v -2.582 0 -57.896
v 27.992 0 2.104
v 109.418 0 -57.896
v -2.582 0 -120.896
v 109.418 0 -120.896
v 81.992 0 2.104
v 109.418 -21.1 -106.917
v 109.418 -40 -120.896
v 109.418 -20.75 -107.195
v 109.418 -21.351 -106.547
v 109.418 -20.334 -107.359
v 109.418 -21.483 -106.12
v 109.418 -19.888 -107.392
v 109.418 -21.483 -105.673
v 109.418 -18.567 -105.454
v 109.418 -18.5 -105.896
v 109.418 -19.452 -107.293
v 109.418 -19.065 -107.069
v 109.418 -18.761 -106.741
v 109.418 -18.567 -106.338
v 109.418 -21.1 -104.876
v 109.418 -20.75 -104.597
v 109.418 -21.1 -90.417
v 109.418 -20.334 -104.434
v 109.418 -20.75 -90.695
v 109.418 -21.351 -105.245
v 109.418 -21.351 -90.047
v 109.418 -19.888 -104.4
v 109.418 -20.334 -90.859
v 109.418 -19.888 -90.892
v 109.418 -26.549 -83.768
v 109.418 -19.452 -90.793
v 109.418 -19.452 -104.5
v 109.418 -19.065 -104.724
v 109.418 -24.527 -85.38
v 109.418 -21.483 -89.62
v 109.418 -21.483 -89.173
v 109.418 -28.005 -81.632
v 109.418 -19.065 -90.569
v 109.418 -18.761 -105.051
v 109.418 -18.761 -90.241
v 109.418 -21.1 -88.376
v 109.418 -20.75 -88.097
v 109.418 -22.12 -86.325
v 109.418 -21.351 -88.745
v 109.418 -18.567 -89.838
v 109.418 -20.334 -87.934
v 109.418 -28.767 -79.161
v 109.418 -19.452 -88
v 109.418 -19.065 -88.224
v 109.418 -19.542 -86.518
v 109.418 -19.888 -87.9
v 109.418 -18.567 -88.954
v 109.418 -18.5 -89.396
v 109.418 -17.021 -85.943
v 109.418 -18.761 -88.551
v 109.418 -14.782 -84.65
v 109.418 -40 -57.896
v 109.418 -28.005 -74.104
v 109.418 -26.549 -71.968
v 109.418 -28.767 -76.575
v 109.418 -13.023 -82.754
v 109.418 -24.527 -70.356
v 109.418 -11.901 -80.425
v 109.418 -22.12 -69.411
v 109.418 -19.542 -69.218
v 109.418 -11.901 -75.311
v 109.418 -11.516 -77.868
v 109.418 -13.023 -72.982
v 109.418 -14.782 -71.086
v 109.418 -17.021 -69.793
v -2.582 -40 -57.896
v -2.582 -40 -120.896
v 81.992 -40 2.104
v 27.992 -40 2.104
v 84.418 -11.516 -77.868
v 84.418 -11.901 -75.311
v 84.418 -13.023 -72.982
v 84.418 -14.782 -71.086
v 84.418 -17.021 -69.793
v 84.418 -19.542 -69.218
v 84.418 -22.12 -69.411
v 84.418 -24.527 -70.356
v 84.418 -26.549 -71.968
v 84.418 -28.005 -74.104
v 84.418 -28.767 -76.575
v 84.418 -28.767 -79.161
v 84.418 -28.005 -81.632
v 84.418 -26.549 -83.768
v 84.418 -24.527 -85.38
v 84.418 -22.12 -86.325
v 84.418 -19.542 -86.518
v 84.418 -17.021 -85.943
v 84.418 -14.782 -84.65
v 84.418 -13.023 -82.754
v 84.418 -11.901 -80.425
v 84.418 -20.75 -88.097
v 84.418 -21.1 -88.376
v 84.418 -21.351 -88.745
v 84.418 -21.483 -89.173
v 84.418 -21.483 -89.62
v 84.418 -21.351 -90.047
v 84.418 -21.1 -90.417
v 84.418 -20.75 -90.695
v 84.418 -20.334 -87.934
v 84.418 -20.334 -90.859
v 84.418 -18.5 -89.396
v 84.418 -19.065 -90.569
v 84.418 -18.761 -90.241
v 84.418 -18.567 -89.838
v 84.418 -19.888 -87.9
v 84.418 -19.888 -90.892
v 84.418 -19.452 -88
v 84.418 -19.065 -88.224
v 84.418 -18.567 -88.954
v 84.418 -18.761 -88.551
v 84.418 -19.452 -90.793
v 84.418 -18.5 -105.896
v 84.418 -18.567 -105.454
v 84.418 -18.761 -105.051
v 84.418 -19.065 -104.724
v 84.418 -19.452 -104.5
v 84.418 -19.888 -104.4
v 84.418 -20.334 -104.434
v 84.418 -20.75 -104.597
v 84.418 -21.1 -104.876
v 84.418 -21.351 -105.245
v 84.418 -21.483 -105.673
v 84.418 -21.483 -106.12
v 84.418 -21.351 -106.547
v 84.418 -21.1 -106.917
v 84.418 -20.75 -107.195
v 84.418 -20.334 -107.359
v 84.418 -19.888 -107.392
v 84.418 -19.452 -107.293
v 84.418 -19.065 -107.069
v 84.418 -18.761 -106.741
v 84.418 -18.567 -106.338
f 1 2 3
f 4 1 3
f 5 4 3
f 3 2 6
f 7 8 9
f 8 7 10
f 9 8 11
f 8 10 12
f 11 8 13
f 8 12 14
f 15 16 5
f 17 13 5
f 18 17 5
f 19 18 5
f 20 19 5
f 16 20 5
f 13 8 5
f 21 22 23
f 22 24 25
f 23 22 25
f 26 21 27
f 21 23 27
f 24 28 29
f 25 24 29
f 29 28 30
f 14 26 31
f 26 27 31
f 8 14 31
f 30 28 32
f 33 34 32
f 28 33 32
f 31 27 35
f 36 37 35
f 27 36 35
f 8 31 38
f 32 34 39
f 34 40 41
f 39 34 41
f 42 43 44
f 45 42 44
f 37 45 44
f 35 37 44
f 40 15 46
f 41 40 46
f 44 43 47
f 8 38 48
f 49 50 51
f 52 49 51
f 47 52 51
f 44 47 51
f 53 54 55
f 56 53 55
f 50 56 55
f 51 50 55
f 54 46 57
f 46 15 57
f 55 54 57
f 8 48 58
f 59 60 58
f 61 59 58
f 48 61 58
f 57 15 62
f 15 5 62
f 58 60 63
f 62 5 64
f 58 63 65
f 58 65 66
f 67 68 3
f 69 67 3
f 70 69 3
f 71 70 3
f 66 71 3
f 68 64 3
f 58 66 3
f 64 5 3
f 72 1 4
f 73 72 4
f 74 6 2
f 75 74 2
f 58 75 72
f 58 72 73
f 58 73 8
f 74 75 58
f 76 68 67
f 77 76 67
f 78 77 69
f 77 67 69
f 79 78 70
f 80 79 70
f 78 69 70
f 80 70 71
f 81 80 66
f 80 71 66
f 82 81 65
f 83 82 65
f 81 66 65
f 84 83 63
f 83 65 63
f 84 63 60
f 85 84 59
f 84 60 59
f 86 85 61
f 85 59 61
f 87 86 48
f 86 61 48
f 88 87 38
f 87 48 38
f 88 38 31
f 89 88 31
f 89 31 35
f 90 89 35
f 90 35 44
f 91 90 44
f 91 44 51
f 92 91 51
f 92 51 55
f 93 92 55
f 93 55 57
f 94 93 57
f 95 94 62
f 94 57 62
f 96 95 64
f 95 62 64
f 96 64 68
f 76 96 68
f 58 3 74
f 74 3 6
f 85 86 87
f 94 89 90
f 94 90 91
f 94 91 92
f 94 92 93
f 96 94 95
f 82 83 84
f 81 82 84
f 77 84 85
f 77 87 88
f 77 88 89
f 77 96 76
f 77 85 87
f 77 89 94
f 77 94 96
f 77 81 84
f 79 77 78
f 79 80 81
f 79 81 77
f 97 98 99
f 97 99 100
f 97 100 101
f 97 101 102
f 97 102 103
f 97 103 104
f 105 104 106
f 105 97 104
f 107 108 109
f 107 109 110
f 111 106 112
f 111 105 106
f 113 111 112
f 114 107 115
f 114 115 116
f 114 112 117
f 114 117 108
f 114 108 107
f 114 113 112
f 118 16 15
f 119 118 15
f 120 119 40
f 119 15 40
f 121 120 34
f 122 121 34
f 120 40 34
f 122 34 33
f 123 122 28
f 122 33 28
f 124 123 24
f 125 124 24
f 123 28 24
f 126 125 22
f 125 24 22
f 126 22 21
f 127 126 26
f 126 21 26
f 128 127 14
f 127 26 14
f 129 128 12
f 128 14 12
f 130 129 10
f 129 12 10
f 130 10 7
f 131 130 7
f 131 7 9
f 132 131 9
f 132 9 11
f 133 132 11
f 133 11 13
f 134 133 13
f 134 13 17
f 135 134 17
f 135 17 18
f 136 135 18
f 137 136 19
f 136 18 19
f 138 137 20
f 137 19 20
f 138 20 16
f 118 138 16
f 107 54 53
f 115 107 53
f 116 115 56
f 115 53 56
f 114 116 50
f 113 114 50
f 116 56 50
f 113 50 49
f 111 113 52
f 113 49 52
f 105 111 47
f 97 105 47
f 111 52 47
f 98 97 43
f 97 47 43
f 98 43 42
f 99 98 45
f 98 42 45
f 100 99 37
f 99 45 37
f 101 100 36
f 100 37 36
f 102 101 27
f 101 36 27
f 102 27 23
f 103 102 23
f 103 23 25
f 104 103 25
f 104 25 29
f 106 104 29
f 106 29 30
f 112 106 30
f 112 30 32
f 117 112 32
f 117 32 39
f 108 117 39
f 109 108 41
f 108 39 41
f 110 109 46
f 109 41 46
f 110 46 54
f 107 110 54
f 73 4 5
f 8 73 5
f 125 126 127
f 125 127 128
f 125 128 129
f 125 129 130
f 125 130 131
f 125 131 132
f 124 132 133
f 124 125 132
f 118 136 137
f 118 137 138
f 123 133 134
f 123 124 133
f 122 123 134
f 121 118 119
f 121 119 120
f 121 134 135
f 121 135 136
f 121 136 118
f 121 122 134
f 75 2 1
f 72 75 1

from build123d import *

# Parameters (mm, degrees)
F1_DEPTH = 40
F2_R     = 1.5
F3_DEPTH = 25
F4_R     = 8.674153
F5_DEPTH = 25


with BuildPart() as f1:
    # F0 (on Front) → F1 (new body)
    with BuildSketch(Plane.XZ):
        Polygon((76.767643, 2.10375), (27.992256, 2.10375), (-2.5816, -57.89625), (-2.5816, -120.89625), (109.4184, -120.89625), (109.4184, -59.39625), (109.4184, -57.89625), (81.992256, 2.10375), align=None)
    extrude(amount=F1_DEPTH)

    # F2 (on face) → F3 (cut)
    with BuildSketch(Plane.YZ.offset(109.4184)):
        with Locations((-20, -105.89625)):
            Circle(F2_R)
        with Locations((-20, -89.39625)):
            Circle(F2_R)
    extrude(amount=-F3_DEPTH, mode=Mode.SUBTRACT)

    # F4 (on face) → F5 (cut)
    with BuildSketch(Plane.YZ.offset(109.4184)):
        with Locations((-20.189999, -77.86797)):
            Circle(F4_R)
    extrude(amount=-F5_DEPTH, mode=Mode.SUBTRACT)


solid = f1.part
